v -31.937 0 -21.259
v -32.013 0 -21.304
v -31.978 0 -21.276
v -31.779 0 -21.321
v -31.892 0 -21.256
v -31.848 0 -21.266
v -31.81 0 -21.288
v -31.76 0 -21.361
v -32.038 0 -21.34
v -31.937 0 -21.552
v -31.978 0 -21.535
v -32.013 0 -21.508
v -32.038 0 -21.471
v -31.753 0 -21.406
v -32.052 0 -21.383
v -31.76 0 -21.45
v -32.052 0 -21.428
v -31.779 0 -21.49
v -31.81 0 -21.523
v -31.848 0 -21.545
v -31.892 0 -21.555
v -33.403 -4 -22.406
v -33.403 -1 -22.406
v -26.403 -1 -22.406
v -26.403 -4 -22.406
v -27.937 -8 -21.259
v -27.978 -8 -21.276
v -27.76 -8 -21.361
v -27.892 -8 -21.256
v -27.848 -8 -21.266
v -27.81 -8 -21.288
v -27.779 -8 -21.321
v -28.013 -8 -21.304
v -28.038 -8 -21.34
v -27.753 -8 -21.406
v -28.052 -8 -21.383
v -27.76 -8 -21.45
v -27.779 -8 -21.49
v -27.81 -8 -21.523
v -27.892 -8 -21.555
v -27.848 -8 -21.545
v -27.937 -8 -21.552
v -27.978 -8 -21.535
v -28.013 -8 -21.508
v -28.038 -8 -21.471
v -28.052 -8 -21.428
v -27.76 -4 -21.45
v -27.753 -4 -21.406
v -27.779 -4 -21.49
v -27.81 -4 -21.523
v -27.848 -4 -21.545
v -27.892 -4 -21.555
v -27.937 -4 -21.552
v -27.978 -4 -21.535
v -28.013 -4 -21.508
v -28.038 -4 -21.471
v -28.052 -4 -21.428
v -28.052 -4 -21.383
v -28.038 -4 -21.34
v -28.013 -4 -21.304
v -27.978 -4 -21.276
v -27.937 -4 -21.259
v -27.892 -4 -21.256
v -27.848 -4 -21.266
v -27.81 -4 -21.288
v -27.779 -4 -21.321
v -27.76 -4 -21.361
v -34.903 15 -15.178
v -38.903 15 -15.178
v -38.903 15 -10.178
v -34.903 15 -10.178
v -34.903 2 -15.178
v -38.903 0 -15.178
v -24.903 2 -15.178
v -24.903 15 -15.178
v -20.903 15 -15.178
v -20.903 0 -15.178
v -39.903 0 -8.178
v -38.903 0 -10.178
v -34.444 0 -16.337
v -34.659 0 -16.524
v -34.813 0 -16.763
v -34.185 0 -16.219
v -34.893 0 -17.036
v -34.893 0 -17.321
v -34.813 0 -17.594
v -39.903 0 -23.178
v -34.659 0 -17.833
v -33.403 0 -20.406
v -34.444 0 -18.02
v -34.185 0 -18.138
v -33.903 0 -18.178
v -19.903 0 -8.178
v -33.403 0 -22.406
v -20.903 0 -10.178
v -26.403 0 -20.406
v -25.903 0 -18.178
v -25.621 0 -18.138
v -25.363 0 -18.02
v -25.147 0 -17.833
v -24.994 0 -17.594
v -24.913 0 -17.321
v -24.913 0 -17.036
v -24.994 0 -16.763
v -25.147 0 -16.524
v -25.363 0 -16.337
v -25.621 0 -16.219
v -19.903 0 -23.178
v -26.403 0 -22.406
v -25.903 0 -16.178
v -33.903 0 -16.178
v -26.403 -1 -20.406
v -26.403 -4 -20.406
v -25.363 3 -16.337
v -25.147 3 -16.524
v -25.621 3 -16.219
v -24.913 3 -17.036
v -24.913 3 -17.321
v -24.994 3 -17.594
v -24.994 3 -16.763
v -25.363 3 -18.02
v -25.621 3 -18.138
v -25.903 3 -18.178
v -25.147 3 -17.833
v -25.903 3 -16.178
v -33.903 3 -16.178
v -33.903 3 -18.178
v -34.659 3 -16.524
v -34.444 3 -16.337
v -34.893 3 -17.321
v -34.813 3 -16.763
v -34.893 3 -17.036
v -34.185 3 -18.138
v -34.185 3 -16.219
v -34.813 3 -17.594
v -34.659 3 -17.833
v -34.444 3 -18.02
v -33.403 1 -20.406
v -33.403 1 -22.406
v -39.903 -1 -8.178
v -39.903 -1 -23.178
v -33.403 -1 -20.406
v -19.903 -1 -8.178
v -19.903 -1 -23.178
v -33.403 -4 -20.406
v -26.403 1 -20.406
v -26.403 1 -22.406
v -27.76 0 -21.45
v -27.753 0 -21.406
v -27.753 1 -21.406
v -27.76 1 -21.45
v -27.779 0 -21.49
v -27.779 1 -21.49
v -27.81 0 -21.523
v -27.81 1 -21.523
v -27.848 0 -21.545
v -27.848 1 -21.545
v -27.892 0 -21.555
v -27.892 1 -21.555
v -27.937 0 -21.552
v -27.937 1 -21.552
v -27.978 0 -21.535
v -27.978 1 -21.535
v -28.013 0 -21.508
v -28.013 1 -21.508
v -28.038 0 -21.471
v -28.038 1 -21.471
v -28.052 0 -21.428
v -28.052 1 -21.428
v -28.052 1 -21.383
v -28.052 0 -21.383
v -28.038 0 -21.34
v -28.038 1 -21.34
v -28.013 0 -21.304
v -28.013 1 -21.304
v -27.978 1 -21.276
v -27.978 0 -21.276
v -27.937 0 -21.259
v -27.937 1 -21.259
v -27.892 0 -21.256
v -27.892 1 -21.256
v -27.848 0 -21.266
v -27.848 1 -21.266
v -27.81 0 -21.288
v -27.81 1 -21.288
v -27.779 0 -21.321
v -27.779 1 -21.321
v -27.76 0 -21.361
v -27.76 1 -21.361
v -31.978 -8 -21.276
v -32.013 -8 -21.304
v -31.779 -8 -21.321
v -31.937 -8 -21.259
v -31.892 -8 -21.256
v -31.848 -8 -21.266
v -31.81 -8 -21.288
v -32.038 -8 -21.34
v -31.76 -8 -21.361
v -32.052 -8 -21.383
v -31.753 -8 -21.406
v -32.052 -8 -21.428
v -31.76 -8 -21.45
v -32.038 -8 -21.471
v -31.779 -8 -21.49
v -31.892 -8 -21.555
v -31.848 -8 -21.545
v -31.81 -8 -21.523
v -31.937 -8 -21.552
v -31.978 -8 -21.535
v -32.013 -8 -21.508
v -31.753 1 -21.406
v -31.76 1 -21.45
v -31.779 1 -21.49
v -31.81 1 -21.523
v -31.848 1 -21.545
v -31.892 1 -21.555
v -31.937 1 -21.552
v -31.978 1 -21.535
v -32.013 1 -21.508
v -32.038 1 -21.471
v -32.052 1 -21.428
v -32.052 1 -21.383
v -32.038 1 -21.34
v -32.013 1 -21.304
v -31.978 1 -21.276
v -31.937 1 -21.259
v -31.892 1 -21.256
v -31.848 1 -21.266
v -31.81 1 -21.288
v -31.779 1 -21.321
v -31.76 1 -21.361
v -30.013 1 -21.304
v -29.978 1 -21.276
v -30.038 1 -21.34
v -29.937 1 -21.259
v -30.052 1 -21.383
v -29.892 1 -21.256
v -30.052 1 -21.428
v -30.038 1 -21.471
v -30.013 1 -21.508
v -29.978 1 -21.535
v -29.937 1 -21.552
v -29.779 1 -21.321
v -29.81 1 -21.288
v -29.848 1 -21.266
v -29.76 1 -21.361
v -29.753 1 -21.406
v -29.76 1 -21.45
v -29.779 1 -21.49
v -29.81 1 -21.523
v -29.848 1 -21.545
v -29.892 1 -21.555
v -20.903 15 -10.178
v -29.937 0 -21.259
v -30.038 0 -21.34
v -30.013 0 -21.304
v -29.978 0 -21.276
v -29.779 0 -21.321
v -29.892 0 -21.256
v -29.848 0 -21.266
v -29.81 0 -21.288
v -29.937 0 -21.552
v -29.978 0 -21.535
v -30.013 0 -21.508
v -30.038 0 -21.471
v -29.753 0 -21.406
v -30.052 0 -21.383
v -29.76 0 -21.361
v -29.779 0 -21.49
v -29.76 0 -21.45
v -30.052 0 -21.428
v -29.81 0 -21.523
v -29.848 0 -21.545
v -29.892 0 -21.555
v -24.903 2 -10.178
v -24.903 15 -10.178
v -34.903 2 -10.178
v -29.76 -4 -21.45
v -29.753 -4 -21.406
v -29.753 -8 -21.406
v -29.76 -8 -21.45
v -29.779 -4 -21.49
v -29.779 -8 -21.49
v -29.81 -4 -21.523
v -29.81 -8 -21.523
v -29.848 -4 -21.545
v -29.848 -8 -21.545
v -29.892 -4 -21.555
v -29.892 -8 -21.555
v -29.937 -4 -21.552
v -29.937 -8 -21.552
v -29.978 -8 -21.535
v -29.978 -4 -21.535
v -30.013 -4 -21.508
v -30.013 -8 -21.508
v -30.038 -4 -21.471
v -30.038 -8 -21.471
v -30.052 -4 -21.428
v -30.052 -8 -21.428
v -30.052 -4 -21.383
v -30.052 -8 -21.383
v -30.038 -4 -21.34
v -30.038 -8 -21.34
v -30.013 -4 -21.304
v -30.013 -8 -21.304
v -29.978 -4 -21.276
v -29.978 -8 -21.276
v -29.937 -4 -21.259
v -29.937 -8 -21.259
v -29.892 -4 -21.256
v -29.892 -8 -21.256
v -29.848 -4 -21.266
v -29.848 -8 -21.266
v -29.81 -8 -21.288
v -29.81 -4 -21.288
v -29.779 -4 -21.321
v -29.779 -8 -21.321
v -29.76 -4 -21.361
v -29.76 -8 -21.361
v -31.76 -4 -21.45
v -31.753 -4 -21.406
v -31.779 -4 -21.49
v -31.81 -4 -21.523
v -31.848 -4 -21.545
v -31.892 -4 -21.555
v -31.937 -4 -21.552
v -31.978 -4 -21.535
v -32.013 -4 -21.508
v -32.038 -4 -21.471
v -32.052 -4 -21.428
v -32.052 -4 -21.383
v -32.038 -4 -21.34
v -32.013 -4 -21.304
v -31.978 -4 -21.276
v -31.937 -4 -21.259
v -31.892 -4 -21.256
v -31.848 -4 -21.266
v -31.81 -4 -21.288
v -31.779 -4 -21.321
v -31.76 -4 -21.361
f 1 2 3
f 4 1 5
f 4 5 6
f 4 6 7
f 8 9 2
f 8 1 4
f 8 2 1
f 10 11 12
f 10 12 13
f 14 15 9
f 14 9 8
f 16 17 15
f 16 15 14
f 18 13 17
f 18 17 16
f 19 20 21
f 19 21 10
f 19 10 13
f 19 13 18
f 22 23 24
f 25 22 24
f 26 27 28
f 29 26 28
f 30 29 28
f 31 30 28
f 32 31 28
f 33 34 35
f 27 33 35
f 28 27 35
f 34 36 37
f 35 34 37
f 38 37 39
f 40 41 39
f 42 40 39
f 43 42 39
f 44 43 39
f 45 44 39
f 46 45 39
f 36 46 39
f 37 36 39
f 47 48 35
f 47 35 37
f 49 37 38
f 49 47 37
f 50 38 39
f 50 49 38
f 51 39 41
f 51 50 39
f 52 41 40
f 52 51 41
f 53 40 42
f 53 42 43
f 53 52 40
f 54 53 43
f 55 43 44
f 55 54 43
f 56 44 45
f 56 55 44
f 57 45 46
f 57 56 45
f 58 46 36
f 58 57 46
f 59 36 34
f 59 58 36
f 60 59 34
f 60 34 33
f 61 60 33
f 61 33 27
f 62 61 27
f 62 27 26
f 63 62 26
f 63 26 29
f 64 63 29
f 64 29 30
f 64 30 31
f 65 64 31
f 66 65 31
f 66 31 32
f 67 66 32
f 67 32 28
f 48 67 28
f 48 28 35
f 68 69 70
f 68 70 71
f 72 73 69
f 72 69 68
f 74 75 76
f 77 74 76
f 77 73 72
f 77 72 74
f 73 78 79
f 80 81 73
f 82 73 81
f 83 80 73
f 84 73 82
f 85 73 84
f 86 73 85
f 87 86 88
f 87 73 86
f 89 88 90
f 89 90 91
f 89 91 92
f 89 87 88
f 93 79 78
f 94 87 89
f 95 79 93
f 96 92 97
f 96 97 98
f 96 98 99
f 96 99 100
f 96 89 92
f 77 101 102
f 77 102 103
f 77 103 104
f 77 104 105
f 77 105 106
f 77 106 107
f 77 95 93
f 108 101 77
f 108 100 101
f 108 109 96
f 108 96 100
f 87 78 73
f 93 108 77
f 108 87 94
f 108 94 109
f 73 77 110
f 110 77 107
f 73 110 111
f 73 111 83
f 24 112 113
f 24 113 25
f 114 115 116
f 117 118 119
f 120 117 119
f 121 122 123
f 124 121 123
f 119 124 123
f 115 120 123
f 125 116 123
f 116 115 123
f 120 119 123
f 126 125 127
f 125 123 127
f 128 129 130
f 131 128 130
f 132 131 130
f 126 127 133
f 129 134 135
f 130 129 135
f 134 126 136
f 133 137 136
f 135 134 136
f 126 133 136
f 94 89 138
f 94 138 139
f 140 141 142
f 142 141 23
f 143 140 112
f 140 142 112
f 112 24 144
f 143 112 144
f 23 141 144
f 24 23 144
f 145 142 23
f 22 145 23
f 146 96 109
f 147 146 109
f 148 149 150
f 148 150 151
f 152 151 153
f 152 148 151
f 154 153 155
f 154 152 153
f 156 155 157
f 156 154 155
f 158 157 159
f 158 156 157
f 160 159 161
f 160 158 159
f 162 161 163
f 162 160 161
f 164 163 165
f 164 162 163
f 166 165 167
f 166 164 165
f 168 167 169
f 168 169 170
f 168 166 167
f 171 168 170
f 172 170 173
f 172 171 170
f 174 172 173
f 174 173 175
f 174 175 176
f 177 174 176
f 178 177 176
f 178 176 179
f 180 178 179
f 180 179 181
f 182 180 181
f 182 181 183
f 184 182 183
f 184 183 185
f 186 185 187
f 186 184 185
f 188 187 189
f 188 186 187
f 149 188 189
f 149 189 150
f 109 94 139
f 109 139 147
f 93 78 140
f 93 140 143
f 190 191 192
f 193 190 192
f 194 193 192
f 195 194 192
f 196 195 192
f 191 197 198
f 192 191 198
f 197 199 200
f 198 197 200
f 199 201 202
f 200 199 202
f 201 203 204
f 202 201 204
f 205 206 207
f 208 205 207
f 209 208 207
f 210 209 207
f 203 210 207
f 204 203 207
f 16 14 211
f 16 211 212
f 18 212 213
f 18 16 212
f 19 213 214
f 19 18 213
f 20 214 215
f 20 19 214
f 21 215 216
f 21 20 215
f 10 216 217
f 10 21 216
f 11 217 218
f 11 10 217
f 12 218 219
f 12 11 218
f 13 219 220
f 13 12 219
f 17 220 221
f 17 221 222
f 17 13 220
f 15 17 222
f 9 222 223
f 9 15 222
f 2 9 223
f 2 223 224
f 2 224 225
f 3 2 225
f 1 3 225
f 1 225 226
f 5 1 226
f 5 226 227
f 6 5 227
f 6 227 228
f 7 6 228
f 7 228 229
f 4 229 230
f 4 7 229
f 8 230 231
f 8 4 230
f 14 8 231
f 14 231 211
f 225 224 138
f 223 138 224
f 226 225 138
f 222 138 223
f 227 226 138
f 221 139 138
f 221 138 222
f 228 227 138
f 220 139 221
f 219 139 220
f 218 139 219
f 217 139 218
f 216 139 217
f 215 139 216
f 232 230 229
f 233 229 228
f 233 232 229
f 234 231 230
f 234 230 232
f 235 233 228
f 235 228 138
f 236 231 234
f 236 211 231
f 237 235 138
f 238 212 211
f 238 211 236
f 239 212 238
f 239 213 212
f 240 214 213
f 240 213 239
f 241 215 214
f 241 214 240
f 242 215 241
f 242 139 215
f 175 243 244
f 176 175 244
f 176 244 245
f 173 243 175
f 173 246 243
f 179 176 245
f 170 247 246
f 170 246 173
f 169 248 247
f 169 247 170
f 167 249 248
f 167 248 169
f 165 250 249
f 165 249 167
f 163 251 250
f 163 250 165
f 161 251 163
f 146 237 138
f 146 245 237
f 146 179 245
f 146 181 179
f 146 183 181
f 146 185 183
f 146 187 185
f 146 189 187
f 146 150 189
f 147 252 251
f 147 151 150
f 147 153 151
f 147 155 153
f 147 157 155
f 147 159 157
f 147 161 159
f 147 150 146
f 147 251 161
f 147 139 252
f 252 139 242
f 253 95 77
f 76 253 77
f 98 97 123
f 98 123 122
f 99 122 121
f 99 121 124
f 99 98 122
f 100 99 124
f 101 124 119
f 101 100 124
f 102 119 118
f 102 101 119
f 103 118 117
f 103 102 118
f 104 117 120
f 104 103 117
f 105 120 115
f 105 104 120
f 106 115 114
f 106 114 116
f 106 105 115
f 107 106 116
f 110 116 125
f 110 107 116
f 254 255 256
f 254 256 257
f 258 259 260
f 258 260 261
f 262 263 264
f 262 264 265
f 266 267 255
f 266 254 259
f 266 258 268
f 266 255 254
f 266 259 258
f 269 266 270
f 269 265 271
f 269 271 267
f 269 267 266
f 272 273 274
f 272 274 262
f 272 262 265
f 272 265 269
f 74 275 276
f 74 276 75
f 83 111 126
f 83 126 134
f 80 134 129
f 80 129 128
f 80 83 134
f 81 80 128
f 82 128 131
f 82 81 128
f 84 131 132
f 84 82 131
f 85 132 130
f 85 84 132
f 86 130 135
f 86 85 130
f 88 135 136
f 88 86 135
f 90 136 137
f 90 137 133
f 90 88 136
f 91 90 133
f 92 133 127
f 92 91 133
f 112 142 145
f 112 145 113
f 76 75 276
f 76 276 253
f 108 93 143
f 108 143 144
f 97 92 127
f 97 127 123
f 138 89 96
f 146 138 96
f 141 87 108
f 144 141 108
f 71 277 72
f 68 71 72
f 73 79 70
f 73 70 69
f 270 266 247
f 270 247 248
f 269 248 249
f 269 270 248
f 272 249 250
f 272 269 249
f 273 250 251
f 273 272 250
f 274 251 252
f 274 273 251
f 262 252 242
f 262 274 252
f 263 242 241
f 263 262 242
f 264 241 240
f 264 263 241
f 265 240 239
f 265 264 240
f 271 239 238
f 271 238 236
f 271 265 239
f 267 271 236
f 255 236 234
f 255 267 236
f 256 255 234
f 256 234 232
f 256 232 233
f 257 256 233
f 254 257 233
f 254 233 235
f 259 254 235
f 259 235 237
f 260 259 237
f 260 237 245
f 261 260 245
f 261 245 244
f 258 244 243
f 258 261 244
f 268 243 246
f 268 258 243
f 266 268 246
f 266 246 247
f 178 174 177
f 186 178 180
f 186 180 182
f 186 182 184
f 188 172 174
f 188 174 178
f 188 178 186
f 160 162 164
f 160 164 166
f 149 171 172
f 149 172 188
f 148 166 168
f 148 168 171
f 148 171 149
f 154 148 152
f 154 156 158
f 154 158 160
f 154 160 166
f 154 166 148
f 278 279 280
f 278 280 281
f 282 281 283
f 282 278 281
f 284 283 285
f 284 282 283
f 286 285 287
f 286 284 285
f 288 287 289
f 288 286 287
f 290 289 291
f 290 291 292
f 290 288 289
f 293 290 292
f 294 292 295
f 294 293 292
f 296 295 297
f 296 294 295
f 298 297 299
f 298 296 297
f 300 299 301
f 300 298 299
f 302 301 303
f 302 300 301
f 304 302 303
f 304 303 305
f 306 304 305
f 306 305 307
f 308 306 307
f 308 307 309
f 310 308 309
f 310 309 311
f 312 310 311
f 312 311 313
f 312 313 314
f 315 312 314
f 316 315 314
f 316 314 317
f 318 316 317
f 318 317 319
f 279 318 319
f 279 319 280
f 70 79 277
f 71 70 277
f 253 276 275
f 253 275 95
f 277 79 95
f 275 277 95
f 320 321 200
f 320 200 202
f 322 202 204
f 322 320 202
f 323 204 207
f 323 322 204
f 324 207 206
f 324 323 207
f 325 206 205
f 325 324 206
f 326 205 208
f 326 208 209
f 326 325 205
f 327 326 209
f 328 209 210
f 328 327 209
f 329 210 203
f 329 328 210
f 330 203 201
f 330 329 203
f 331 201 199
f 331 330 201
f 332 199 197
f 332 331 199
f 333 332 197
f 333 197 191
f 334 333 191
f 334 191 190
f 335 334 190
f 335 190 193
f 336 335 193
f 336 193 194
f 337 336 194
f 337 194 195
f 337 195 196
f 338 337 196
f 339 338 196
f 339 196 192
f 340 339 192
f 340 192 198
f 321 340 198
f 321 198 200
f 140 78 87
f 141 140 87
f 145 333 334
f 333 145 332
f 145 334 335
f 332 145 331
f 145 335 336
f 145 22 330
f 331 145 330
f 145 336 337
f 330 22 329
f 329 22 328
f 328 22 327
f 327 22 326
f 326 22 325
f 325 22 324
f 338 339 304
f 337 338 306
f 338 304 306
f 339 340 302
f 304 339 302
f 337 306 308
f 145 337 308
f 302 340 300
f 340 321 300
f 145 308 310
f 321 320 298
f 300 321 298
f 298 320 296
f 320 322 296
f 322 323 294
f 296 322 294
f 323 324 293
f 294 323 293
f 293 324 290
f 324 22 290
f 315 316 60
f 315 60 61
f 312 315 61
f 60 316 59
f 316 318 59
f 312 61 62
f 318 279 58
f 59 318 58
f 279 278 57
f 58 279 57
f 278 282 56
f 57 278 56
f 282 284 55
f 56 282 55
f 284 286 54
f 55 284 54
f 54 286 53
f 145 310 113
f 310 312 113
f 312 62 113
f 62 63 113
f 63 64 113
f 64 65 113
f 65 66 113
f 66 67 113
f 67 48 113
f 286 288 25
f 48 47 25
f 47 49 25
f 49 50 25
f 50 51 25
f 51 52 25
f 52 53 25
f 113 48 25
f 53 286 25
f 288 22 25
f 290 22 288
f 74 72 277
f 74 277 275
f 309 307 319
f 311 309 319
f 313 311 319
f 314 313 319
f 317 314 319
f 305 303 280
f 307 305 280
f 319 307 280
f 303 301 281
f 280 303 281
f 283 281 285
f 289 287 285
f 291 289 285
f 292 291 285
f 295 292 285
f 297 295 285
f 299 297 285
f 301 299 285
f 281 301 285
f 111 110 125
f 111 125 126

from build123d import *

# Parameters (mm, degrees)
ESQUISSE1_W             = 20
ESQUISSE1_H             = 15
BOSS_EXTRU_3_DEPTH      = 1
ESQUISSE1_5_W           = 10
ESQUISSE1_5_H           = 5
BOSS_EXTRU_4_DEPTH      = 2
ESQUISSE1_6_W           = 4
ESQUISSE1_6_H           = 5
BOSS_EXTRU_5_DEPTH      = 15
BOSS_EXTRU_6_DEPTH      = 3
BOSS_EXTRU_7_DEPTH      = 1
BOSS_EXTRU_7_DEPTH_BACK = 4
ESQUISSE1_8_W           = 7
ESQUISSE1_8_H           = 2
ESQUISSE1_8_R           = 0.15
BOSS_EXTRU_8_START      = -8
ESQUISSE1_9_R           = 0.15
BOSS_EXTRU_8_DEPTH      = 8


with BuildPart() as part:
    # Esquisse1 → Boss.-Extru.3 (new body)
    with BuildSketch(Plane(origin=(0, 0, 0), x_dir=(1, 0, 0), z_dir=(0, 1, 0))):
        with Locations((-29.903190877, 15.678459307)):
            Rectangle(ESQUISSE1_W, ESQUISSE1_H)
    extrude(amount=-BOSS_EXTRU_3_DEPTH)

    # Esquisse1_5 → Boss.-Extru.4 (add)
    with BuildSketch(Plane(origin=(0, 0, 0), x_dir=(1, 0, 0), z_dir=(0, 1, 0))):
        with Locations((-29.903190877, 12.678459307)):
            Rectangle(ESQUISSE1_5_W, ESQUISSE1_5_H)
    extrude(amount=BOSS_EXTRU_4_DEPTH)

    # Esquisse1_6 → Boss.-Extru.5 (add)
    with BuildSketch(Plane(origin=(0, 0, 0), x_dir=(1, 0, 0), z_dir=(0, 1, 0))):
        with Locations((-36.903190877, 12.678459307)):
            Rectangle(ESQUISSE1_6_W, ESQUISSE1_6_H)
        with Locations((-22.903190877, 12.678459307)):
            Rectangle(ESQUISSE1_6_W, ESQUISSE1_6_H)
    extrude(amount=BOSS_EXTRU_5_DEPTH)

    # Esquisse1_7 → Boss.-Extru.6 (add)
    with BuildSketch(Plane(origin=(0, 0, 0), x_dir=(1, 0, 0), z_dir=(0, 1, 0))):
        with BuildLine():
            Line((-25.903190877, 18.178459307), (-33.903190877, 18.178459307))
            ThreePointArc((-33.903190877, 18.178459307), (-34.903190877, 17.178459307), (-33.903190877, 16.178459307))
            Line((-33.903190877, 16.178459307), (-25.903190877, 16.178459307))
            ThreePointArc((-25.903190877, 16.178459307), (-24.903190877, 17.178459307), (-25.903190877, 18.178459307))
        make_face()
    extrude(amount=BOSS_EXTRU_6_DEPTH)

    # Esquisse1_8 → Boss.-Extru.7 (add, two sides: drawn at the far end of the back side and taken through both)
    with BuildSketch(Plane(origin=(0, 0, 0), x_dir=(1, 0, 0), z_dir=(0, 1, 0)).offset(-BOSS_EXTRU_7_DEPTH_BACK)):
        with Locations((-29.903190877, 21.405559188)):
            Rectangle(ESQUISSE1_8_W, ESQUISSE1_8_H)
        with Locations((-31.903190877, 21.405559188)):
            Circle(ESQUISSE1_8_R, mode=Mode.SUBTRACT)
        with Locations((-29.903190877, 21.405559188)):
            Circle(ESQUISSE1_8_R, mode=Mode.SUBTRACT)
        with Locations((-27.903190877, 21.405559188)):
            Circle(ESQUISSE1_8_R, mode=Mode.SUBTRACT)
    extrude(amount=BOSS_EXTRU_7_DEPTH + BOSS_EXTRU_7_DEPTH_BACK)

    # Esquisse1_9 → Boss.-Extru.8 (add)
    with BuildSketch(Plane(origin=(0, 0, 0), x_dir=(1, 0, 0), z_dir=(0, 1, 0)).offset(BOSS_EXTRU_8_START)):
        with Locations((-31.903190877, 21.405559188)):
            Circle(ESQUISSE1_9_R)
        with Locations((-29.903190877, 21.405559188)):
            Circle(ESQUISSE1_9_R)
        with Locations((-27.903190877, 21.405559188)):
            Circle(ESQUISSE1_9_R)
    extrude(amount=BOSS_EXTRU_8_DEPTH)


solid = part.part
